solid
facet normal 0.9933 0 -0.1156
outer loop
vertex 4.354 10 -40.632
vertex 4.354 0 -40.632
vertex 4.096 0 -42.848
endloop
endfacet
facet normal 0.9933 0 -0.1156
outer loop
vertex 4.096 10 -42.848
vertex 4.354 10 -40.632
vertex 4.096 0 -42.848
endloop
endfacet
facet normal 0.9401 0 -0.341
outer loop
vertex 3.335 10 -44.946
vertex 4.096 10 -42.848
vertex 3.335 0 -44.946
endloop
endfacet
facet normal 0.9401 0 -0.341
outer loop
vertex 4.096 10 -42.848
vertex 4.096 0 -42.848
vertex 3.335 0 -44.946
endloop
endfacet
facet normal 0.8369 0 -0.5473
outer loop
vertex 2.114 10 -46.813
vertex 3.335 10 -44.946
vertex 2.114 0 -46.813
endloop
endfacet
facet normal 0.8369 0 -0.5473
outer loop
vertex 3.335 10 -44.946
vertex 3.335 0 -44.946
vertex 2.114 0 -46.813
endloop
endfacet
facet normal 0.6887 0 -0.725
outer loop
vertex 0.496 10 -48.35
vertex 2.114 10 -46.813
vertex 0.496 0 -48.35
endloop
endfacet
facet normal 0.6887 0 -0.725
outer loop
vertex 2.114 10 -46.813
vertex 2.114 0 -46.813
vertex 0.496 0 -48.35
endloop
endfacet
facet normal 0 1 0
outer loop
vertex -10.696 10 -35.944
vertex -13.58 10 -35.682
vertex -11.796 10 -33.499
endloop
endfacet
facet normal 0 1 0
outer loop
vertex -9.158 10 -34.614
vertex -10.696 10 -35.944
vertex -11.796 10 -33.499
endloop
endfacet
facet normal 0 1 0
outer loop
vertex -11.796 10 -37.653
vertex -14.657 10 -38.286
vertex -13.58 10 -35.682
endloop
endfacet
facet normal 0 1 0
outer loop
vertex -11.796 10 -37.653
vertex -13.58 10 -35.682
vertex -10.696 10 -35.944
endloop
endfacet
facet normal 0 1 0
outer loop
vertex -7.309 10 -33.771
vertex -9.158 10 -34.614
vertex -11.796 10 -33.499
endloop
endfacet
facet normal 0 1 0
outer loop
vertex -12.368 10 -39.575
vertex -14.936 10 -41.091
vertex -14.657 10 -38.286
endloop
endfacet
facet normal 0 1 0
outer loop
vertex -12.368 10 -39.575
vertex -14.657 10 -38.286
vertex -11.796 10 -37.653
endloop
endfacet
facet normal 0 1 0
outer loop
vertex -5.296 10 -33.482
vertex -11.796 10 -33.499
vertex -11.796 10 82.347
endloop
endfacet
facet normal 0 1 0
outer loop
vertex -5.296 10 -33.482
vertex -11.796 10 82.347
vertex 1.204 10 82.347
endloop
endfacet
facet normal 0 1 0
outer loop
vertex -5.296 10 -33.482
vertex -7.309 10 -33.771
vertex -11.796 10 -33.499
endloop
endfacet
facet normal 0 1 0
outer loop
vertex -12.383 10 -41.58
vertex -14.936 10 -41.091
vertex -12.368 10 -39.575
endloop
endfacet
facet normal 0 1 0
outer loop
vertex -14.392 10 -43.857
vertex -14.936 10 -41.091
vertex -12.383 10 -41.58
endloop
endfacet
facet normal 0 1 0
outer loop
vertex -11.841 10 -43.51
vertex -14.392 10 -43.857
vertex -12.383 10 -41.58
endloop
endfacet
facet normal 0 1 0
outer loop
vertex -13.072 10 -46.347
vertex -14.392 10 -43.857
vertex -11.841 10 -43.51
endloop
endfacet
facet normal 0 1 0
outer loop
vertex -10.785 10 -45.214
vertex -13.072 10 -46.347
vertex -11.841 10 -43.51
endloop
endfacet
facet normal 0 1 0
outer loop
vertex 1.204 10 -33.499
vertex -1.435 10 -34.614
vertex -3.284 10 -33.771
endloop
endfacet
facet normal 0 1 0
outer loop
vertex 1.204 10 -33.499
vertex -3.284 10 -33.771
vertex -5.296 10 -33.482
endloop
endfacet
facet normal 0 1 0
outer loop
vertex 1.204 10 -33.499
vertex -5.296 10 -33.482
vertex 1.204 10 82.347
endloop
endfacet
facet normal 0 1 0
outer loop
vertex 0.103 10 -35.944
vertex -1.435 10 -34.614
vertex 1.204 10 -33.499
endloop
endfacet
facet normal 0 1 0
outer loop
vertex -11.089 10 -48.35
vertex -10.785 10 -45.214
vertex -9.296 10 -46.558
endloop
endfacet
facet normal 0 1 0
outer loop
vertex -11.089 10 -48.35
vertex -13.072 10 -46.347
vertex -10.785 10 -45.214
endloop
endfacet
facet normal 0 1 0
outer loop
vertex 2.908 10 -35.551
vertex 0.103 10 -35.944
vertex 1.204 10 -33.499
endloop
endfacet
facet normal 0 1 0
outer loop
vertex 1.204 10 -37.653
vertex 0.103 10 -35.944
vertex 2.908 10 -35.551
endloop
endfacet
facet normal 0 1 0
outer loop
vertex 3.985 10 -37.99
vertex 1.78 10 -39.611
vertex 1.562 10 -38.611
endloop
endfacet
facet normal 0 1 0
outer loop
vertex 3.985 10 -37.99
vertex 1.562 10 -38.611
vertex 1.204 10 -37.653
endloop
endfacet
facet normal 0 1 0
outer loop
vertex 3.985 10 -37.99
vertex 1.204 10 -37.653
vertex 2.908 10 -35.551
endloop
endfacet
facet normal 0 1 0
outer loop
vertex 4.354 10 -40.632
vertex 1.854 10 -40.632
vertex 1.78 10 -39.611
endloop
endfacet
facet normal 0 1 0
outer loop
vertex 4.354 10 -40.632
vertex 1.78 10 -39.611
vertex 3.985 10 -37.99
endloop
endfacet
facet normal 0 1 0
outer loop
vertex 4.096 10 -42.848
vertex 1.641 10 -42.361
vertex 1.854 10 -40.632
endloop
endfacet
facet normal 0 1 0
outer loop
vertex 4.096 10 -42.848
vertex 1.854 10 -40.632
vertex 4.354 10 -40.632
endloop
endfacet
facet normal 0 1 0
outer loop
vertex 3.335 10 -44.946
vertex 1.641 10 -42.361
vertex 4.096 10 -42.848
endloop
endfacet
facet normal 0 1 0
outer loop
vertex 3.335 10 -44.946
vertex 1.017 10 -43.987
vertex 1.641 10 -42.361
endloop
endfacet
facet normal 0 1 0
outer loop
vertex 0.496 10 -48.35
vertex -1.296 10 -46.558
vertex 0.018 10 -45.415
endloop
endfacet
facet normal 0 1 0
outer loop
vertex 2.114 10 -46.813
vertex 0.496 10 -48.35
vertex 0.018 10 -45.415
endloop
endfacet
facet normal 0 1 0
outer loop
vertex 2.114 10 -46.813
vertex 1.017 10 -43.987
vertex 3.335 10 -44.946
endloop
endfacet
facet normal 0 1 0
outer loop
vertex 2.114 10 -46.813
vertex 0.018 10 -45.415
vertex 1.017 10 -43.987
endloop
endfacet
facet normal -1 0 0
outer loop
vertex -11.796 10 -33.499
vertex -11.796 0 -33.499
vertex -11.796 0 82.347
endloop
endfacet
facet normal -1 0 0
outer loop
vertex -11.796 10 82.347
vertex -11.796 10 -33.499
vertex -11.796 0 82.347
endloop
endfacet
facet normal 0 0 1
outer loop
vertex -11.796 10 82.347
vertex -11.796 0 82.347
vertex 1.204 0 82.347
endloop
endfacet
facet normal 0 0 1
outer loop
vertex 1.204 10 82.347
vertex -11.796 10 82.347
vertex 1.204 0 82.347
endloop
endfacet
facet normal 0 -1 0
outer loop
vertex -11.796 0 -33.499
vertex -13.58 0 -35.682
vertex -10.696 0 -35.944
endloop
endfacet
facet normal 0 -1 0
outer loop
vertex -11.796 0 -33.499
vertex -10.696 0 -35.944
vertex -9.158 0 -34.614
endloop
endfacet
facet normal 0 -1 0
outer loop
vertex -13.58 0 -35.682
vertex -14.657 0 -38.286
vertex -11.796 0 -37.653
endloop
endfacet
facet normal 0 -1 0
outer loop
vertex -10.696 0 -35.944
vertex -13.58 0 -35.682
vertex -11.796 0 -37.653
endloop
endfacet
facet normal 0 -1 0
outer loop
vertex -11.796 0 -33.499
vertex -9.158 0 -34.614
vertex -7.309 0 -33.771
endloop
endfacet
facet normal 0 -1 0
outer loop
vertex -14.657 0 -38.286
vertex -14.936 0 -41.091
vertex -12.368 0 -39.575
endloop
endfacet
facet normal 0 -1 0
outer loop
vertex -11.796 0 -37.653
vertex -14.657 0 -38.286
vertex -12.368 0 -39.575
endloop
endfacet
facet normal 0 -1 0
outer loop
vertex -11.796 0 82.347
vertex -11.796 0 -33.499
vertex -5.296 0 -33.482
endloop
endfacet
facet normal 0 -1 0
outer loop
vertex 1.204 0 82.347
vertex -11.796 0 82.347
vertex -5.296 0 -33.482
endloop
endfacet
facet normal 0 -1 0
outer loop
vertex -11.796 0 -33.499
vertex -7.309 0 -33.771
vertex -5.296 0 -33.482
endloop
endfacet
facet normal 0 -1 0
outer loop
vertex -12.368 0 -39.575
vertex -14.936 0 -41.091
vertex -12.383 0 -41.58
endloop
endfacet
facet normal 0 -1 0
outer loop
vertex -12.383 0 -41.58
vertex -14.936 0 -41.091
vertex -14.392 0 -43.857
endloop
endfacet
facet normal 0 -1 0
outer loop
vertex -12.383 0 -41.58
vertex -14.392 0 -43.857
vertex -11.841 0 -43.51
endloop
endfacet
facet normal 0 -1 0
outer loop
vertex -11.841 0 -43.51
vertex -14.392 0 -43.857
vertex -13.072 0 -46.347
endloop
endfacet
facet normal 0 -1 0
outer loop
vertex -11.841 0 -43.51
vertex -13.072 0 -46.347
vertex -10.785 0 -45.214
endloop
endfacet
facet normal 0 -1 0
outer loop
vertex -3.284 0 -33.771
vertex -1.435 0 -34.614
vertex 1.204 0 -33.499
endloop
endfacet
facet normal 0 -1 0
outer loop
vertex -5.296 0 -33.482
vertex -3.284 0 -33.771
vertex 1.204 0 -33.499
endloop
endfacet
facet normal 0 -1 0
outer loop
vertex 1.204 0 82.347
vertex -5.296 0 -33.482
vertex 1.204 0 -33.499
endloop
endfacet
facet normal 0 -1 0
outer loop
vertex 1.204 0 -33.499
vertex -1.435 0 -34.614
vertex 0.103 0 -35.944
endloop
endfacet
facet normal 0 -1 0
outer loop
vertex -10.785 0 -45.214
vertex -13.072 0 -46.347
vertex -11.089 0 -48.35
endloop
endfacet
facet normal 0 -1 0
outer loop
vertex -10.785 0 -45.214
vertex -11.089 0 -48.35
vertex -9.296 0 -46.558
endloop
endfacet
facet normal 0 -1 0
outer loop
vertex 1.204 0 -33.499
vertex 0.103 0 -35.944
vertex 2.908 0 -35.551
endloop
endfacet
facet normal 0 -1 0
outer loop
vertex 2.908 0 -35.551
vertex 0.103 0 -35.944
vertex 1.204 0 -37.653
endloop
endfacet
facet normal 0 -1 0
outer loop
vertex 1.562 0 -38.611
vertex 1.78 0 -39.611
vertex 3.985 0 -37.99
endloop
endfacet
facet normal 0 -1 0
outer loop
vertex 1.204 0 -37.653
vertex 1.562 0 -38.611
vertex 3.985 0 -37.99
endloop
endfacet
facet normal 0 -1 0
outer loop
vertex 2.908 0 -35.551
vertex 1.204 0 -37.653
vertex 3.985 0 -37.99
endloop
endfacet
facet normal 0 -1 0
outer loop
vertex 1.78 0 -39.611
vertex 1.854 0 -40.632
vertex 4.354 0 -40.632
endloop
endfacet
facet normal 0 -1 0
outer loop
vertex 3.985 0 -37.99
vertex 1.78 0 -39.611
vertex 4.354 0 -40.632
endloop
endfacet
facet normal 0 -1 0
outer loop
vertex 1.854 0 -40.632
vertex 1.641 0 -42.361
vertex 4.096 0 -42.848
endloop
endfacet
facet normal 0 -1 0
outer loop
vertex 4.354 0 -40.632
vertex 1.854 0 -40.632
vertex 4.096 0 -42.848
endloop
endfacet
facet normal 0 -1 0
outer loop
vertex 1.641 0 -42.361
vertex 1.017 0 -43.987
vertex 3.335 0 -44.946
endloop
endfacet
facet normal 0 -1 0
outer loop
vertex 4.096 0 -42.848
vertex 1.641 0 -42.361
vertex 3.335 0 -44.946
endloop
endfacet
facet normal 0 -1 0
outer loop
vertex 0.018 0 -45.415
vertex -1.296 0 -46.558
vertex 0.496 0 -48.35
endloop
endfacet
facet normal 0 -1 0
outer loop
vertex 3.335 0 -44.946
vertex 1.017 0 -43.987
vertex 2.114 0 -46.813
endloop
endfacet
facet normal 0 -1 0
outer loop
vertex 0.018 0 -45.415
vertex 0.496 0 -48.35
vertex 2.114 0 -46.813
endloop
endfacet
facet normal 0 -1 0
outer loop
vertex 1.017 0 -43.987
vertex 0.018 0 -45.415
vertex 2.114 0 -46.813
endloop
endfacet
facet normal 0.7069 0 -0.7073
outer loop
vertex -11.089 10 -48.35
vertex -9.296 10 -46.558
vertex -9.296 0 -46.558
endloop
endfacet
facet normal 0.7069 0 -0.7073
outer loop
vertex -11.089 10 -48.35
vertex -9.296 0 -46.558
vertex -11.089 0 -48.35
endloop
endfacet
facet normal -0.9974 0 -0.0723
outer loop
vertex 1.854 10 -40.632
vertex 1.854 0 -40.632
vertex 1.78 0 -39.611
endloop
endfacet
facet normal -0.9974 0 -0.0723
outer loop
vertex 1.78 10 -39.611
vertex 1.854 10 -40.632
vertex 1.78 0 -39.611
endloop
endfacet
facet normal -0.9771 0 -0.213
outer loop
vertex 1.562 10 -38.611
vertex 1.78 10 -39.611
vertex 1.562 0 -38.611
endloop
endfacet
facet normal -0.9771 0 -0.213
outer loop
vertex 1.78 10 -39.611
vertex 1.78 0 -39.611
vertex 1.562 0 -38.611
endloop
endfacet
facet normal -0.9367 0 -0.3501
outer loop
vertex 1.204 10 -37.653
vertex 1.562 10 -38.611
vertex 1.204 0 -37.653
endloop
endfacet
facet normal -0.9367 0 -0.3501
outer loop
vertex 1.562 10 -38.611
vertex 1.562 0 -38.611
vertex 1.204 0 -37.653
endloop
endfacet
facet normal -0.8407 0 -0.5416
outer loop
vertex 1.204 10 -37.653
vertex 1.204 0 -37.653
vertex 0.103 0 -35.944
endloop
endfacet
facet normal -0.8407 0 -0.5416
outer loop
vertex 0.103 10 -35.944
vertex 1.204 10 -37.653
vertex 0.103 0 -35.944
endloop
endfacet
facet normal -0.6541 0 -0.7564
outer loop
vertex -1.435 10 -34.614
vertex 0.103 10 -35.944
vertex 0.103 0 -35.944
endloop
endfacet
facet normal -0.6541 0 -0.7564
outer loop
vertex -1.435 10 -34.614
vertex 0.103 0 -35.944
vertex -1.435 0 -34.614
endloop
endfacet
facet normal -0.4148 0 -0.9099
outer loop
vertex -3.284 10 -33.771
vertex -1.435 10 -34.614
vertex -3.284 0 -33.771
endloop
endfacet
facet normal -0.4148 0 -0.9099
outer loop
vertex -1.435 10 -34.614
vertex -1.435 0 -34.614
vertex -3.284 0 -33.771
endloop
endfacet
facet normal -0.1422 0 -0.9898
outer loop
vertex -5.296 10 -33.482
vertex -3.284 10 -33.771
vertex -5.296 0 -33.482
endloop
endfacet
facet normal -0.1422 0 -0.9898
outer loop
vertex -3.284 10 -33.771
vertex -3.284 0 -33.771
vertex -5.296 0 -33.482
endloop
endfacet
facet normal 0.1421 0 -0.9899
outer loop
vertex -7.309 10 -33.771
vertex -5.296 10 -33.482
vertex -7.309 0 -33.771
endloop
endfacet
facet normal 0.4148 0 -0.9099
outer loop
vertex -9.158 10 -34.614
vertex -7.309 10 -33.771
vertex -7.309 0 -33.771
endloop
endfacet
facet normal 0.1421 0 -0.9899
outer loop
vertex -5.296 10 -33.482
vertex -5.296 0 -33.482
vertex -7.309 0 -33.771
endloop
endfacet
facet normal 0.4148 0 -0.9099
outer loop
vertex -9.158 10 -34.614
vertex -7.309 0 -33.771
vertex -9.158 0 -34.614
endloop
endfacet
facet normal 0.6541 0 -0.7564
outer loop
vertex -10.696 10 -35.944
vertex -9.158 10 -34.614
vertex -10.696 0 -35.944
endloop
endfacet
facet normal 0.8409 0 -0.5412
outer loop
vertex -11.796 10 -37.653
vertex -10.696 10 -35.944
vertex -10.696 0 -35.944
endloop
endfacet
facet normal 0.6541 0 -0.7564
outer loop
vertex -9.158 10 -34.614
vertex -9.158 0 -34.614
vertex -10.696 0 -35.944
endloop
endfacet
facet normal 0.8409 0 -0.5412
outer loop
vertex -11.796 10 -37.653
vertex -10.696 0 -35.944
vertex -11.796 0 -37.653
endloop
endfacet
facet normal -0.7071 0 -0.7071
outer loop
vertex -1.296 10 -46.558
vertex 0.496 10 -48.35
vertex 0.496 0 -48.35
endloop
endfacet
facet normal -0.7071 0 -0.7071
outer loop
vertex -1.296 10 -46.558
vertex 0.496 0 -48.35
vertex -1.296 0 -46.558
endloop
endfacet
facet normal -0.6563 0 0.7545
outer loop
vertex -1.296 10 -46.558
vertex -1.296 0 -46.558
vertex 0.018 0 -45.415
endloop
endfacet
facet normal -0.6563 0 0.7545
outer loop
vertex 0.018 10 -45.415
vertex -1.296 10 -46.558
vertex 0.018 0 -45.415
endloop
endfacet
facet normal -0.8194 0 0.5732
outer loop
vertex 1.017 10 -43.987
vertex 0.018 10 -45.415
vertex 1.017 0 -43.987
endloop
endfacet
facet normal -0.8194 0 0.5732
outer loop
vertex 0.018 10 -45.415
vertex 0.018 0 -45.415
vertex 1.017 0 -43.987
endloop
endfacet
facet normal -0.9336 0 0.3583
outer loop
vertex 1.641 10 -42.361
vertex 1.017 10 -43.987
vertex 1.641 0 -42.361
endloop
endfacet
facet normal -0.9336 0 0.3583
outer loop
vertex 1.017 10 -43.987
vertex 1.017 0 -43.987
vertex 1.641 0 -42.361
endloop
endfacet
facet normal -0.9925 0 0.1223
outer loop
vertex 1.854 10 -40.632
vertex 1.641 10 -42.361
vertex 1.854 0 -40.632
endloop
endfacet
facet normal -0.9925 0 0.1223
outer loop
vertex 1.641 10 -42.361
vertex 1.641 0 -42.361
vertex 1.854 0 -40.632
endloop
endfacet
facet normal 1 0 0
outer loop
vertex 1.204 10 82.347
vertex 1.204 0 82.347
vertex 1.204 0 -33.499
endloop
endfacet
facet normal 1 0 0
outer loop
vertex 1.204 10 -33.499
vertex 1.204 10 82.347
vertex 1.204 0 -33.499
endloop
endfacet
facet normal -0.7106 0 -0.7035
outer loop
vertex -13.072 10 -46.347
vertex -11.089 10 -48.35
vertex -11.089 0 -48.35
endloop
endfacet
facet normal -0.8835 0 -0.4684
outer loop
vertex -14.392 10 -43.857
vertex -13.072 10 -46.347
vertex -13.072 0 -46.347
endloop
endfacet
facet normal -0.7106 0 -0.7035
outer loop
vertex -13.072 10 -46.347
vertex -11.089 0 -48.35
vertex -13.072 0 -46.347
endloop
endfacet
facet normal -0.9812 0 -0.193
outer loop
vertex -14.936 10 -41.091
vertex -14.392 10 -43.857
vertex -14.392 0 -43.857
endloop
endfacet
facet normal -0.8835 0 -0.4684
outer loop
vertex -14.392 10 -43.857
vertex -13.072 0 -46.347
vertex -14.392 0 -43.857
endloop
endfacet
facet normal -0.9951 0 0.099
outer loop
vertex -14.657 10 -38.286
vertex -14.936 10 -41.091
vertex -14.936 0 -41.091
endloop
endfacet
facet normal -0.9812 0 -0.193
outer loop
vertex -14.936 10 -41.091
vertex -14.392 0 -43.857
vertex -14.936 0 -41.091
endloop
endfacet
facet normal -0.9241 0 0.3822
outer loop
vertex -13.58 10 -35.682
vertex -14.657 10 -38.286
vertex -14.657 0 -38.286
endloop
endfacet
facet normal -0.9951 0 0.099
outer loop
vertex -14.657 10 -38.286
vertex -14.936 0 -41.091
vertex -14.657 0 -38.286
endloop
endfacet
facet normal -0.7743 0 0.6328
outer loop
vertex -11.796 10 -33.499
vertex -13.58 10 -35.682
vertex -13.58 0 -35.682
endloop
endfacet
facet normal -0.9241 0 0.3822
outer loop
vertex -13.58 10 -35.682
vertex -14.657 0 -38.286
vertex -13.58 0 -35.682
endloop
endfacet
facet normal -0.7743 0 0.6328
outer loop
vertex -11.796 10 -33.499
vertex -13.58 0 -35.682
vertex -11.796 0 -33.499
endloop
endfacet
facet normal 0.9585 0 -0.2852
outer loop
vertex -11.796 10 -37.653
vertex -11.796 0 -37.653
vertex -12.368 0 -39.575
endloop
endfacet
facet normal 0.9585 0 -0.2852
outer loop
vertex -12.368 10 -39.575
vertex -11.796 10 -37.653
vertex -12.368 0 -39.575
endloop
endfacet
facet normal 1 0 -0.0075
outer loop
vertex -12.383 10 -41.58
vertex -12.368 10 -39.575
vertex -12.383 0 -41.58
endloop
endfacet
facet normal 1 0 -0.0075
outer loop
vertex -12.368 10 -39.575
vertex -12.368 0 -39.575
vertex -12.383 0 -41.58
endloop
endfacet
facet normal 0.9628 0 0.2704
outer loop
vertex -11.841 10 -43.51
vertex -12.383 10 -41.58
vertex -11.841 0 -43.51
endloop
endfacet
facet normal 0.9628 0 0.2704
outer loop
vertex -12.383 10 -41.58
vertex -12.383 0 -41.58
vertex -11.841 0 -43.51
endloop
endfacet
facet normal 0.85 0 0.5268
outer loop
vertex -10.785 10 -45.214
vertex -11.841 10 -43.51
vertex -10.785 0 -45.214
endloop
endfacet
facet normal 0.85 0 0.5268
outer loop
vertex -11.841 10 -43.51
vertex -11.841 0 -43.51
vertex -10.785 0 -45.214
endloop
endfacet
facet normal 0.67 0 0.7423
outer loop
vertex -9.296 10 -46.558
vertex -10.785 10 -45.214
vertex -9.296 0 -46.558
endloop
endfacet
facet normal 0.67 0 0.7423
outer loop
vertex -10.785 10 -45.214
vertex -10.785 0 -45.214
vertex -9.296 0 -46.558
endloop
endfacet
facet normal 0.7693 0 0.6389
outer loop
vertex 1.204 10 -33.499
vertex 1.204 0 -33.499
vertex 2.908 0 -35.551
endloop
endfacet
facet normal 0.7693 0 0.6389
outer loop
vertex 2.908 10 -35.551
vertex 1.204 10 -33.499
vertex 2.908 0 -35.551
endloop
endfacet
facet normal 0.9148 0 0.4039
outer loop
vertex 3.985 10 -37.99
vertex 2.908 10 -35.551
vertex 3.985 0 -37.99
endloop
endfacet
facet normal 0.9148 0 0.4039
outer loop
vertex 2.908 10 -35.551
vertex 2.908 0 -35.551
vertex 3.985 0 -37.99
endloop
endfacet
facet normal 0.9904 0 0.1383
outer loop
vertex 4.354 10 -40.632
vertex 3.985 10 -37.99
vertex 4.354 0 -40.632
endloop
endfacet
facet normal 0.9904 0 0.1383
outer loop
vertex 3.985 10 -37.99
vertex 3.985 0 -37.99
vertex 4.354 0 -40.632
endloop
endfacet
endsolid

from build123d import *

# Parameters (mm, degrees)
SCHIZZO1_R                   = 7.15
ESTRUSIONE_ESTRUSIONE1_DEPTH = 10
TAGLIO_ESTRUSIONE1_DEPTH     = 85.287841486


with BuildPart() as part:
    # Schizzo1 → Estrusione-Estrusione1 (new body)
    with BuildSketch(Plane(origin=(0, 0, 0), x_dir=(1, 0, 0), z_dir=(0, 1, 0))):
        with BuildLine():
            Line((-11.796487194, 33.499091111), (-11.796487194, -82.347087033))
            Line((-11.796487194, -82.347087033), (1.203512806, -82.347087033))
            Line((1.203512806, -82.347087033), (1.203512806, 33.499091111))
            ThreePointArc((1.203512806, 33.499091111), (-5.296487194, 50.281587168), (-11.796487194, 33.499091111))
        make_face()
        with Locations((-5.296487194, 40.631587168)):
            Circle(SCHIZZO1_R, mode=Mode.SUBTRACT)
    extrude(amount=ESTRUSIONE_ESTRUSIONE1_DEPTH)

    # Schizzo2 → Taglio-Estrusione1 (cut, through all)
    with BuildSketch(Plane(origin=(0, 10, 0), x_dir=(1, 0, 0), z_dir=(0, 1, 0))):
        Polygon((-16.367555006, 53.62907886), (5.774580618, 53.62907886), (-1.296487194, 46.558011048), (-9.296487194, 46.558011048), align=None)
    extrude(amount=-TAGLIO_ESTRUSIONE1_DEPTH, mode=Mode.SUBTRACT)


solid = part.part
